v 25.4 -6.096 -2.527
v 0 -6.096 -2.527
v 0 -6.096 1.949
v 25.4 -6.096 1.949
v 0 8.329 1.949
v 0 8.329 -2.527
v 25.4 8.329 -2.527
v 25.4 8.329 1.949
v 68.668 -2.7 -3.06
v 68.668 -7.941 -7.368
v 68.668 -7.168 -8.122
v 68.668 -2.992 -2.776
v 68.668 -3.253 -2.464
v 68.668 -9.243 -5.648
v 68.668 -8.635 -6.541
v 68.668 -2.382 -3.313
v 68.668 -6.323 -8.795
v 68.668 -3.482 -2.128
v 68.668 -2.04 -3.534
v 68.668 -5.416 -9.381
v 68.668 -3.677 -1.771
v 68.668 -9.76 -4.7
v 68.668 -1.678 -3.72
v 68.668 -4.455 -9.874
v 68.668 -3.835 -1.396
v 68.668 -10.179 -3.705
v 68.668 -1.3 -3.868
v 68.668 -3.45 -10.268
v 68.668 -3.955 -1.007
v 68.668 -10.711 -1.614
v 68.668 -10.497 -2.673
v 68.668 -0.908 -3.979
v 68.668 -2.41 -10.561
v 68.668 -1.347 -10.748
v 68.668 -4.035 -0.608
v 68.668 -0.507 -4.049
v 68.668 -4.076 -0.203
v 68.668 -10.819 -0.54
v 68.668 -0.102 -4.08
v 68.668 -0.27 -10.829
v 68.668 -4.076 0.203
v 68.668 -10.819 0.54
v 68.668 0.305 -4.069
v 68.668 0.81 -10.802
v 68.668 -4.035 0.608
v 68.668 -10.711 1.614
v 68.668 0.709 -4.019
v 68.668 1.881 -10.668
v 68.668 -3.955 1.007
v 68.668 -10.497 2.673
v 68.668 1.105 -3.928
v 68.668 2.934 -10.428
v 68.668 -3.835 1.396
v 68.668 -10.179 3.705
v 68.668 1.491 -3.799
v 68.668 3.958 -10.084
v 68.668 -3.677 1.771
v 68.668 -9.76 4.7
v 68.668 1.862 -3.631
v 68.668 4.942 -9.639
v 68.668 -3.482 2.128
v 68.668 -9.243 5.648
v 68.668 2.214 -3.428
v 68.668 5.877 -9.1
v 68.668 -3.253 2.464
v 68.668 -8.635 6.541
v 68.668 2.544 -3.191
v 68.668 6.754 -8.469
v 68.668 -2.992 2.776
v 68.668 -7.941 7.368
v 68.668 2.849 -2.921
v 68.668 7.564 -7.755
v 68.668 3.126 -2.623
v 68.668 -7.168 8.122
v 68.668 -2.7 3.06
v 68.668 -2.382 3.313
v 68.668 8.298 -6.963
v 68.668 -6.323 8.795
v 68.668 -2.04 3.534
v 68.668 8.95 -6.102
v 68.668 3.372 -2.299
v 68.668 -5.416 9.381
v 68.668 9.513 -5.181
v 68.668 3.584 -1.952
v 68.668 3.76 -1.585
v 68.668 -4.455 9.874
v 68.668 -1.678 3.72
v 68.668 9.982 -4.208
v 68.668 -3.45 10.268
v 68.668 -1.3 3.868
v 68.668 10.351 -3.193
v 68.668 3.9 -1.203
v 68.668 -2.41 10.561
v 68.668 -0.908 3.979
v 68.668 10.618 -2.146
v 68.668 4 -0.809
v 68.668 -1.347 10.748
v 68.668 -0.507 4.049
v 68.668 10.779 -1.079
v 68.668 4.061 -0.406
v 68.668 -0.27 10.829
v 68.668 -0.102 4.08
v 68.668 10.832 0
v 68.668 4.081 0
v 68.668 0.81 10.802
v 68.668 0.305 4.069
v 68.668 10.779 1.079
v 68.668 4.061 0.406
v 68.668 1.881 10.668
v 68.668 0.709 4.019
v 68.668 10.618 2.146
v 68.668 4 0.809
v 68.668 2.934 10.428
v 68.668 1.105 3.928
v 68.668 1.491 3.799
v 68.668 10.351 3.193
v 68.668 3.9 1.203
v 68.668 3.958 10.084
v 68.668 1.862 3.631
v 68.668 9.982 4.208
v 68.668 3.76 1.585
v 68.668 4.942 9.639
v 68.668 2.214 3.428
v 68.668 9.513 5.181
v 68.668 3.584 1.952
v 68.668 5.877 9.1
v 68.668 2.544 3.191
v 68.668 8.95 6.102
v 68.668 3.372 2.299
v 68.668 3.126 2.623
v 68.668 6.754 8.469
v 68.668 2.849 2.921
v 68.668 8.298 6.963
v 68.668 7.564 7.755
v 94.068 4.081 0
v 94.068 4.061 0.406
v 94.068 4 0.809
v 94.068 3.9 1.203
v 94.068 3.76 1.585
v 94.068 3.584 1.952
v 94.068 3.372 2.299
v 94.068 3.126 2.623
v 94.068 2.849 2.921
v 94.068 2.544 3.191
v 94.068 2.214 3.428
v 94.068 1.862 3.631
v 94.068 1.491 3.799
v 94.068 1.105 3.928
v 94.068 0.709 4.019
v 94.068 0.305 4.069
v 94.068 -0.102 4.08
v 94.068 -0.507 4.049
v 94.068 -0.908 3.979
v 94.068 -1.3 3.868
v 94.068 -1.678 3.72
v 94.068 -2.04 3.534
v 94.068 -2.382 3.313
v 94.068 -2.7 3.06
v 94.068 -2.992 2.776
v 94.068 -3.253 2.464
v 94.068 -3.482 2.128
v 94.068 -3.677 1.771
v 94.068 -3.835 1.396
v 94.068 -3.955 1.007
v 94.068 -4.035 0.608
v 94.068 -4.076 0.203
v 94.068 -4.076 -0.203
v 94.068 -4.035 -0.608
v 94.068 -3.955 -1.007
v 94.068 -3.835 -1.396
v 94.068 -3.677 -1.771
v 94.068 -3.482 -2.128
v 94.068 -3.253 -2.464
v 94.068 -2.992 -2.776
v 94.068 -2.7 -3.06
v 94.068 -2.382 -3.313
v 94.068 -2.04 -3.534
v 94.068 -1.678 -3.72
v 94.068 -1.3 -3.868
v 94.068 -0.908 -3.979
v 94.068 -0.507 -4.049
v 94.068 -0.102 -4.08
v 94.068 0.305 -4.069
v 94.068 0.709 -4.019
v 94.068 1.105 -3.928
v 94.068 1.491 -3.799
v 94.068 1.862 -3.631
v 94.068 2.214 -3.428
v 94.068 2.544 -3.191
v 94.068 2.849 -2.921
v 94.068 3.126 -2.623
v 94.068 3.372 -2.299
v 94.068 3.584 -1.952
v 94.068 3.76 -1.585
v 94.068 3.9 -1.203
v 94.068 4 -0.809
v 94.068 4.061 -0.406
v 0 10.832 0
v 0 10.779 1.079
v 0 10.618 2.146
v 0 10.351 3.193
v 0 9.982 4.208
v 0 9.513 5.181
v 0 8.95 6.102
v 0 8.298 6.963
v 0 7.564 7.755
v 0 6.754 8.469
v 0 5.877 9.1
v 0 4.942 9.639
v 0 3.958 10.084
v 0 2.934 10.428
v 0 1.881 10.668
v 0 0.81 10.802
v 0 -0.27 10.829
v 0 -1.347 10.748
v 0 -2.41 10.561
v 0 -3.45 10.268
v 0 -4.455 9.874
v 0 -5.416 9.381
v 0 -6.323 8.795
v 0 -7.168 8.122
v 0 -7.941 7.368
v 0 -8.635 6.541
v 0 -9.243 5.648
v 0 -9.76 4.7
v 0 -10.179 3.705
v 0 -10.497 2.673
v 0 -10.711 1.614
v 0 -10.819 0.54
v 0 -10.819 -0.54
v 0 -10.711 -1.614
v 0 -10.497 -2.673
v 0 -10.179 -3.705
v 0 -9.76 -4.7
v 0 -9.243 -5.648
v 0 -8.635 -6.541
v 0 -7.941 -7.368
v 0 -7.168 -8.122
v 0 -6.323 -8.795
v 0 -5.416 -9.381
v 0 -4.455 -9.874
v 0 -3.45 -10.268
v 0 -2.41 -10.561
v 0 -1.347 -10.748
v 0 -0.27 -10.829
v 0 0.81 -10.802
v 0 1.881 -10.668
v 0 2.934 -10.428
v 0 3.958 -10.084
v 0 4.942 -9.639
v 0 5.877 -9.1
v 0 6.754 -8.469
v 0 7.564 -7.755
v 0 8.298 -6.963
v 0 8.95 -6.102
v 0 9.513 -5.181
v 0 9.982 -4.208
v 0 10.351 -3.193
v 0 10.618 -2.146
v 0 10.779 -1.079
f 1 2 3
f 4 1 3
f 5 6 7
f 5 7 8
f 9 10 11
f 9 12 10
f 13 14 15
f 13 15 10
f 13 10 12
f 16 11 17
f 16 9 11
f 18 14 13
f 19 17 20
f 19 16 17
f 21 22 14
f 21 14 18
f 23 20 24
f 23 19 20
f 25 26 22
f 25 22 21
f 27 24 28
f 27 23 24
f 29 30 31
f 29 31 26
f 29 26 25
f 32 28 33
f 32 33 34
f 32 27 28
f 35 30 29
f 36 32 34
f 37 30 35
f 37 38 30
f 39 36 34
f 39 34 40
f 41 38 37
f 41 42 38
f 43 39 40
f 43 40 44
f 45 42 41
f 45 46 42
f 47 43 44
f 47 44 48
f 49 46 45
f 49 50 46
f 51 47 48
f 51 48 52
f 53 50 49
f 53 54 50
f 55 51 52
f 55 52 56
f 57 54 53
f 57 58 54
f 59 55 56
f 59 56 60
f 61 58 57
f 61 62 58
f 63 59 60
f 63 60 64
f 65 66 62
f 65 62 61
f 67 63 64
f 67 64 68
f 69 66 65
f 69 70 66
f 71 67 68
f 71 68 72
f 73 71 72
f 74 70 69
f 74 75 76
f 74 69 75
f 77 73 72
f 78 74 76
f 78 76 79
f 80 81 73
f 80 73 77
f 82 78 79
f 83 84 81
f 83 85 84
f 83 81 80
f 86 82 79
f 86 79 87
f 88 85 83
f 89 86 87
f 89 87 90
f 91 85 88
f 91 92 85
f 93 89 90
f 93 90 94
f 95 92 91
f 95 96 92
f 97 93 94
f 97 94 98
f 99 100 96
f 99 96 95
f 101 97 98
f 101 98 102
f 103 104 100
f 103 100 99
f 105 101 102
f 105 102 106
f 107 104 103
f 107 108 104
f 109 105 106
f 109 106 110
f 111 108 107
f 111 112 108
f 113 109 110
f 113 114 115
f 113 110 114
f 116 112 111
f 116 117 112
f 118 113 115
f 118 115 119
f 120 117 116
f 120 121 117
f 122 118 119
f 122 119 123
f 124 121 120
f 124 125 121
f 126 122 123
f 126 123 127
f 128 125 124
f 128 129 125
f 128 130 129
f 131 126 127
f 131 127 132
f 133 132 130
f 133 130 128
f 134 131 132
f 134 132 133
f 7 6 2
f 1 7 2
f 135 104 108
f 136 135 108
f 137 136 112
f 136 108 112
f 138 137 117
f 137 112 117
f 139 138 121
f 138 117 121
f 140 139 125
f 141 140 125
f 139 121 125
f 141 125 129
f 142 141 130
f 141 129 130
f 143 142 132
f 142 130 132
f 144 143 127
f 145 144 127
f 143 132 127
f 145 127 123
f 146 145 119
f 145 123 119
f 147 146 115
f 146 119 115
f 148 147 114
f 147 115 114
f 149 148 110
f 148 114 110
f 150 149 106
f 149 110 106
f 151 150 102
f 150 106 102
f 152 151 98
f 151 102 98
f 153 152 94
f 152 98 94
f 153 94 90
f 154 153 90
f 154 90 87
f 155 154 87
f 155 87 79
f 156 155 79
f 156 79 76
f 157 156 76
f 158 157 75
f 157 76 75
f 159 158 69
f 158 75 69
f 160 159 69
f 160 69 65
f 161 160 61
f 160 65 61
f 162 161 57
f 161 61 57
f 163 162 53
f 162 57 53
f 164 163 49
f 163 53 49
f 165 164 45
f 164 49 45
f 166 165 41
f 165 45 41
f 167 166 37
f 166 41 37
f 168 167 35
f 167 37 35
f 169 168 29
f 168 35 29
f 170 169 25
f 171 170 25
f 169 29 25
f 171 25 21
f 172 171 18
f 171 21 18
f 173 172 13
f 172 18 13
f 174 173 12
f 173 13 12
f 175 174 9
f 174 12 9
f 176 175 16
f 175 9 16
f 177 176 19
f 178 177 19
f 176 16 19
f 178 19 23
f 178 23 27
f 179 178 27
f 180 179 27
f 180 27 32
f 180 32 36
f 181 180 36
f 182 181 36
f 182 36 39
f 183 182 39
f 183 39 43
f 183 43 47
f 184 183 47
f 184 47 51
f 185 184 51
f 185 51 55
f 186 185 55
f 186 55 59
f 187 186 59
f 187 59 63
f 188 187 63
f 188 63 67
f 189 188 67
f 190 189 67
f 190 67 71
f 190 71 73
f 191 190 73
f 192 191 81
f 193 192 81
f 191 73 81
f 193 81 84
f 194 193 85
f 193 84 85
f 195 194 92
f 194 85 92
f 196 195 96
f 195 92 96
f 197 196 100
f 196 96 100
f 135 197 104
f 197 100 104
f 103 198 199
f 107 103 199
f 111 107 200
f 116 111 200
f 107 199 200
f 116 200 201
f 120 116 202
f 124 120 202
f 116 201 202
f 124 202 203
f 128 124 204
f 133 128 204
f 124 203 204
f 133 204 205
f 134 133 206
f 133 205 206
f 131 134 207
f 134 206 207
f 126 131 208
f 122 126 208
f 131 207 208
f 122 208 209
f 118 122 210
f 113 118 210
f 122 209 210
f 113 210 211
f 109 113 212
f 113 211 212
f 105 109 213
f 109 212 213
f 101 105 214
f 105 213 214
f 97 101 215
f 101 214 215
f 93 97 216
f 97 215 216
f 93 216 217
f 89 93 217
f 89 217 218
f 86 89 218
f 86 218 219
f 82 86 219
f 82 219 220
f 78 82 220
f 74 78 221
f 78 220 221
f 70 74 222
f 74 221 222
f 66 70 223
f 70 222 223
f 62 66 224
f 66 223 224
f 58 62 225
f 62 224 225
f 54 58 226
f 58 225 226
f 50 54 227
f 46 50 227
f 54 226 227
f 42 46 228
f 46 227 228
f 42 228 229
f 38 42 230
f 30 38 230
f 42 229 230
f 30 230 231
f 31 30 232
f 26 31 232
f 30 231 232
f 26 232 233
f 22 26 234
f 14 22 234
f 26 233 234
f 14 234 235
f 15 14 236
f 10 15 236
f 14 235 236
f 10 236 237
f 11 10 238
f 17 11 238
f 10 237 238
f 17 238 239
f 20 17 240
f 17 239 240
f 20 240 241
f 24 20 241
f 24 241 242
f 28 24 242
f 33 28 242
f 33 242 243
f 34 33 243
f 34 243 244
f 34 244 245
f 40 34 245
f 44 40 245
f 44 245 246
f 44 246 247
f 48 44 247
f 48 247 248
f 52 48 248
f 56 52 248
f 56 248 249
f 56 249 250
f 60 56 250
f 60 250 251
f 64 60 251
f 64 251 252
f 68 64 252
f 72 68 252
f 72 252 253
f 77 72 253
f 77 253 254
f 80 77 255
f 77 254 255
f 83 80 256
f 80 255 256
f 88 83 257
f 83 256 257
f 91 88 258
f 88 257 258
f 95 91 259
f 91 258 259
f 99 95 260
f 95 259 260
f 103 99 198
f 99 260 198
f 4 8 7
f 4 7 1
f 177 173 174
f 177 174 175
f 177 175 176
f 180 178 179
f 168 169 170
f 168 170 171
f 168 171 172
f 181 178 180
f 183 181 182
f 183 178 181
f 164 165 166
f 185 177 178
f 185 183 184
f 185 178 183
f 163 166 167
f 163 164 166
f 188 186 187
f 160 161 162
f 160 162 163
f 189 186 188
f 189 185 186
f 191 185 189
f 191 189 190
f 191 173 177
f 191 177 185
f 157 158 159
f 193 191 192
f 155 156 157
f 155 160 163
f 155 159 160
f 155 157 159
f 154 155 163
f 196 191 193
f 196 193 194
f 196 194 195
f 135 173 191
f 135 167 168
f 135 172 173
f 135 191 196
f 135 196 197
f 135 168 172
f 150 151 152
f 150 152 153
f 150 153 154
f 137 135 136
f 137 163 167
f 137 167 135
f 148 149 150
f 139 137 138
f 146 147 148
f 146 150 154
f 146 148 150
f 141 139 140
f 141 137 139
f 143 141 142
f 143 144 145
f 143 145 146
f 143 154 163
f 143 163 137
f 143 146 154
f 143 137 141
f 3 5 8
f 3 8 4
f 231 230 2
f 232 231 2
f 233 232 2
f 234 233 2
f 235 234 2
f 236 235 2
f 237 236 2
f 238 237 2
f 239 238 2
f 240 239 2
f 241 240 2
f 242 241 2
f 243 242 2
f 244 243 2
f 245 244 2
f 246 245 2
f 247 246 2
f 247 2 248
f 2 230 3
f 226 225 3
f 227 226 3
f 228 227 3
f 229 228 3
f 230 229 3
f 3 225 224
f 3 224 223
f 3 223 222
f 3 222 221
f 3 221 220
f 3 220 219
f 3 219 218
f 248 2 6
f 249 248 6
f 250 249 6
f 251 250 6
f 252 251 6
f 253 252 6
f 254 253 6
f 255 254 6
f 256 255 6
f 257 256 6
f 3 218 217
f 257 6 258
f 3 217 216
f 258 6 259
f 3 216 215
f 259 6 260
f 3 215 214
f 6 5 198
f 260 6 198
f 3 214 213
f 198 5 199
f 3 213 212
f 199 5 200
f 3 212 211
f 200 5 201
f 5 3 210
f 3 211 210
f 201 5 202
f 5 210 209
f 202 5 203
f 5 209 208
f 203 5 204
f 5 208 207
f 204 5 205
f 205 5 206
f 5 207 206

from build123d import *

# Parameters (mm, degrees)
F0_R     = 10.832434
F1_DEPTH = 68.66801
F2_R     = 4.08089
F3_DEPTH = 25.4
F4_W     = 14.424835
F4_H     = 4.475396
F5_DEPTH = 25.4


with BuildPart() as f1:
    # F0 (on Right) → F1 (new body)
    with BuildSketch(Plane.YZ):
        Circle(F0_R)
    extrude(amount=F1_DEPTH)

    # F2 (on face) → F3 (join)
    with BuildSketch(Plane.YZ.offset(68.66801)):
        Circle(F2_R)
    extrude(amount=F3_DEPTH)

    # F4 (on face) → F5 (cut)
    with BuildSketch(Plane(origin=(0, 0, 0), x_dir=(0, -1, 0), z_dir=(-1, 0, 0))):
        with Locations((-1.116385, -0.288975)):
            Rectangle(F4_W, F4_H)
    extrude(amount=-F5_DEPTH, mode=Mode.SUBTRACT)


solid = f1.part
